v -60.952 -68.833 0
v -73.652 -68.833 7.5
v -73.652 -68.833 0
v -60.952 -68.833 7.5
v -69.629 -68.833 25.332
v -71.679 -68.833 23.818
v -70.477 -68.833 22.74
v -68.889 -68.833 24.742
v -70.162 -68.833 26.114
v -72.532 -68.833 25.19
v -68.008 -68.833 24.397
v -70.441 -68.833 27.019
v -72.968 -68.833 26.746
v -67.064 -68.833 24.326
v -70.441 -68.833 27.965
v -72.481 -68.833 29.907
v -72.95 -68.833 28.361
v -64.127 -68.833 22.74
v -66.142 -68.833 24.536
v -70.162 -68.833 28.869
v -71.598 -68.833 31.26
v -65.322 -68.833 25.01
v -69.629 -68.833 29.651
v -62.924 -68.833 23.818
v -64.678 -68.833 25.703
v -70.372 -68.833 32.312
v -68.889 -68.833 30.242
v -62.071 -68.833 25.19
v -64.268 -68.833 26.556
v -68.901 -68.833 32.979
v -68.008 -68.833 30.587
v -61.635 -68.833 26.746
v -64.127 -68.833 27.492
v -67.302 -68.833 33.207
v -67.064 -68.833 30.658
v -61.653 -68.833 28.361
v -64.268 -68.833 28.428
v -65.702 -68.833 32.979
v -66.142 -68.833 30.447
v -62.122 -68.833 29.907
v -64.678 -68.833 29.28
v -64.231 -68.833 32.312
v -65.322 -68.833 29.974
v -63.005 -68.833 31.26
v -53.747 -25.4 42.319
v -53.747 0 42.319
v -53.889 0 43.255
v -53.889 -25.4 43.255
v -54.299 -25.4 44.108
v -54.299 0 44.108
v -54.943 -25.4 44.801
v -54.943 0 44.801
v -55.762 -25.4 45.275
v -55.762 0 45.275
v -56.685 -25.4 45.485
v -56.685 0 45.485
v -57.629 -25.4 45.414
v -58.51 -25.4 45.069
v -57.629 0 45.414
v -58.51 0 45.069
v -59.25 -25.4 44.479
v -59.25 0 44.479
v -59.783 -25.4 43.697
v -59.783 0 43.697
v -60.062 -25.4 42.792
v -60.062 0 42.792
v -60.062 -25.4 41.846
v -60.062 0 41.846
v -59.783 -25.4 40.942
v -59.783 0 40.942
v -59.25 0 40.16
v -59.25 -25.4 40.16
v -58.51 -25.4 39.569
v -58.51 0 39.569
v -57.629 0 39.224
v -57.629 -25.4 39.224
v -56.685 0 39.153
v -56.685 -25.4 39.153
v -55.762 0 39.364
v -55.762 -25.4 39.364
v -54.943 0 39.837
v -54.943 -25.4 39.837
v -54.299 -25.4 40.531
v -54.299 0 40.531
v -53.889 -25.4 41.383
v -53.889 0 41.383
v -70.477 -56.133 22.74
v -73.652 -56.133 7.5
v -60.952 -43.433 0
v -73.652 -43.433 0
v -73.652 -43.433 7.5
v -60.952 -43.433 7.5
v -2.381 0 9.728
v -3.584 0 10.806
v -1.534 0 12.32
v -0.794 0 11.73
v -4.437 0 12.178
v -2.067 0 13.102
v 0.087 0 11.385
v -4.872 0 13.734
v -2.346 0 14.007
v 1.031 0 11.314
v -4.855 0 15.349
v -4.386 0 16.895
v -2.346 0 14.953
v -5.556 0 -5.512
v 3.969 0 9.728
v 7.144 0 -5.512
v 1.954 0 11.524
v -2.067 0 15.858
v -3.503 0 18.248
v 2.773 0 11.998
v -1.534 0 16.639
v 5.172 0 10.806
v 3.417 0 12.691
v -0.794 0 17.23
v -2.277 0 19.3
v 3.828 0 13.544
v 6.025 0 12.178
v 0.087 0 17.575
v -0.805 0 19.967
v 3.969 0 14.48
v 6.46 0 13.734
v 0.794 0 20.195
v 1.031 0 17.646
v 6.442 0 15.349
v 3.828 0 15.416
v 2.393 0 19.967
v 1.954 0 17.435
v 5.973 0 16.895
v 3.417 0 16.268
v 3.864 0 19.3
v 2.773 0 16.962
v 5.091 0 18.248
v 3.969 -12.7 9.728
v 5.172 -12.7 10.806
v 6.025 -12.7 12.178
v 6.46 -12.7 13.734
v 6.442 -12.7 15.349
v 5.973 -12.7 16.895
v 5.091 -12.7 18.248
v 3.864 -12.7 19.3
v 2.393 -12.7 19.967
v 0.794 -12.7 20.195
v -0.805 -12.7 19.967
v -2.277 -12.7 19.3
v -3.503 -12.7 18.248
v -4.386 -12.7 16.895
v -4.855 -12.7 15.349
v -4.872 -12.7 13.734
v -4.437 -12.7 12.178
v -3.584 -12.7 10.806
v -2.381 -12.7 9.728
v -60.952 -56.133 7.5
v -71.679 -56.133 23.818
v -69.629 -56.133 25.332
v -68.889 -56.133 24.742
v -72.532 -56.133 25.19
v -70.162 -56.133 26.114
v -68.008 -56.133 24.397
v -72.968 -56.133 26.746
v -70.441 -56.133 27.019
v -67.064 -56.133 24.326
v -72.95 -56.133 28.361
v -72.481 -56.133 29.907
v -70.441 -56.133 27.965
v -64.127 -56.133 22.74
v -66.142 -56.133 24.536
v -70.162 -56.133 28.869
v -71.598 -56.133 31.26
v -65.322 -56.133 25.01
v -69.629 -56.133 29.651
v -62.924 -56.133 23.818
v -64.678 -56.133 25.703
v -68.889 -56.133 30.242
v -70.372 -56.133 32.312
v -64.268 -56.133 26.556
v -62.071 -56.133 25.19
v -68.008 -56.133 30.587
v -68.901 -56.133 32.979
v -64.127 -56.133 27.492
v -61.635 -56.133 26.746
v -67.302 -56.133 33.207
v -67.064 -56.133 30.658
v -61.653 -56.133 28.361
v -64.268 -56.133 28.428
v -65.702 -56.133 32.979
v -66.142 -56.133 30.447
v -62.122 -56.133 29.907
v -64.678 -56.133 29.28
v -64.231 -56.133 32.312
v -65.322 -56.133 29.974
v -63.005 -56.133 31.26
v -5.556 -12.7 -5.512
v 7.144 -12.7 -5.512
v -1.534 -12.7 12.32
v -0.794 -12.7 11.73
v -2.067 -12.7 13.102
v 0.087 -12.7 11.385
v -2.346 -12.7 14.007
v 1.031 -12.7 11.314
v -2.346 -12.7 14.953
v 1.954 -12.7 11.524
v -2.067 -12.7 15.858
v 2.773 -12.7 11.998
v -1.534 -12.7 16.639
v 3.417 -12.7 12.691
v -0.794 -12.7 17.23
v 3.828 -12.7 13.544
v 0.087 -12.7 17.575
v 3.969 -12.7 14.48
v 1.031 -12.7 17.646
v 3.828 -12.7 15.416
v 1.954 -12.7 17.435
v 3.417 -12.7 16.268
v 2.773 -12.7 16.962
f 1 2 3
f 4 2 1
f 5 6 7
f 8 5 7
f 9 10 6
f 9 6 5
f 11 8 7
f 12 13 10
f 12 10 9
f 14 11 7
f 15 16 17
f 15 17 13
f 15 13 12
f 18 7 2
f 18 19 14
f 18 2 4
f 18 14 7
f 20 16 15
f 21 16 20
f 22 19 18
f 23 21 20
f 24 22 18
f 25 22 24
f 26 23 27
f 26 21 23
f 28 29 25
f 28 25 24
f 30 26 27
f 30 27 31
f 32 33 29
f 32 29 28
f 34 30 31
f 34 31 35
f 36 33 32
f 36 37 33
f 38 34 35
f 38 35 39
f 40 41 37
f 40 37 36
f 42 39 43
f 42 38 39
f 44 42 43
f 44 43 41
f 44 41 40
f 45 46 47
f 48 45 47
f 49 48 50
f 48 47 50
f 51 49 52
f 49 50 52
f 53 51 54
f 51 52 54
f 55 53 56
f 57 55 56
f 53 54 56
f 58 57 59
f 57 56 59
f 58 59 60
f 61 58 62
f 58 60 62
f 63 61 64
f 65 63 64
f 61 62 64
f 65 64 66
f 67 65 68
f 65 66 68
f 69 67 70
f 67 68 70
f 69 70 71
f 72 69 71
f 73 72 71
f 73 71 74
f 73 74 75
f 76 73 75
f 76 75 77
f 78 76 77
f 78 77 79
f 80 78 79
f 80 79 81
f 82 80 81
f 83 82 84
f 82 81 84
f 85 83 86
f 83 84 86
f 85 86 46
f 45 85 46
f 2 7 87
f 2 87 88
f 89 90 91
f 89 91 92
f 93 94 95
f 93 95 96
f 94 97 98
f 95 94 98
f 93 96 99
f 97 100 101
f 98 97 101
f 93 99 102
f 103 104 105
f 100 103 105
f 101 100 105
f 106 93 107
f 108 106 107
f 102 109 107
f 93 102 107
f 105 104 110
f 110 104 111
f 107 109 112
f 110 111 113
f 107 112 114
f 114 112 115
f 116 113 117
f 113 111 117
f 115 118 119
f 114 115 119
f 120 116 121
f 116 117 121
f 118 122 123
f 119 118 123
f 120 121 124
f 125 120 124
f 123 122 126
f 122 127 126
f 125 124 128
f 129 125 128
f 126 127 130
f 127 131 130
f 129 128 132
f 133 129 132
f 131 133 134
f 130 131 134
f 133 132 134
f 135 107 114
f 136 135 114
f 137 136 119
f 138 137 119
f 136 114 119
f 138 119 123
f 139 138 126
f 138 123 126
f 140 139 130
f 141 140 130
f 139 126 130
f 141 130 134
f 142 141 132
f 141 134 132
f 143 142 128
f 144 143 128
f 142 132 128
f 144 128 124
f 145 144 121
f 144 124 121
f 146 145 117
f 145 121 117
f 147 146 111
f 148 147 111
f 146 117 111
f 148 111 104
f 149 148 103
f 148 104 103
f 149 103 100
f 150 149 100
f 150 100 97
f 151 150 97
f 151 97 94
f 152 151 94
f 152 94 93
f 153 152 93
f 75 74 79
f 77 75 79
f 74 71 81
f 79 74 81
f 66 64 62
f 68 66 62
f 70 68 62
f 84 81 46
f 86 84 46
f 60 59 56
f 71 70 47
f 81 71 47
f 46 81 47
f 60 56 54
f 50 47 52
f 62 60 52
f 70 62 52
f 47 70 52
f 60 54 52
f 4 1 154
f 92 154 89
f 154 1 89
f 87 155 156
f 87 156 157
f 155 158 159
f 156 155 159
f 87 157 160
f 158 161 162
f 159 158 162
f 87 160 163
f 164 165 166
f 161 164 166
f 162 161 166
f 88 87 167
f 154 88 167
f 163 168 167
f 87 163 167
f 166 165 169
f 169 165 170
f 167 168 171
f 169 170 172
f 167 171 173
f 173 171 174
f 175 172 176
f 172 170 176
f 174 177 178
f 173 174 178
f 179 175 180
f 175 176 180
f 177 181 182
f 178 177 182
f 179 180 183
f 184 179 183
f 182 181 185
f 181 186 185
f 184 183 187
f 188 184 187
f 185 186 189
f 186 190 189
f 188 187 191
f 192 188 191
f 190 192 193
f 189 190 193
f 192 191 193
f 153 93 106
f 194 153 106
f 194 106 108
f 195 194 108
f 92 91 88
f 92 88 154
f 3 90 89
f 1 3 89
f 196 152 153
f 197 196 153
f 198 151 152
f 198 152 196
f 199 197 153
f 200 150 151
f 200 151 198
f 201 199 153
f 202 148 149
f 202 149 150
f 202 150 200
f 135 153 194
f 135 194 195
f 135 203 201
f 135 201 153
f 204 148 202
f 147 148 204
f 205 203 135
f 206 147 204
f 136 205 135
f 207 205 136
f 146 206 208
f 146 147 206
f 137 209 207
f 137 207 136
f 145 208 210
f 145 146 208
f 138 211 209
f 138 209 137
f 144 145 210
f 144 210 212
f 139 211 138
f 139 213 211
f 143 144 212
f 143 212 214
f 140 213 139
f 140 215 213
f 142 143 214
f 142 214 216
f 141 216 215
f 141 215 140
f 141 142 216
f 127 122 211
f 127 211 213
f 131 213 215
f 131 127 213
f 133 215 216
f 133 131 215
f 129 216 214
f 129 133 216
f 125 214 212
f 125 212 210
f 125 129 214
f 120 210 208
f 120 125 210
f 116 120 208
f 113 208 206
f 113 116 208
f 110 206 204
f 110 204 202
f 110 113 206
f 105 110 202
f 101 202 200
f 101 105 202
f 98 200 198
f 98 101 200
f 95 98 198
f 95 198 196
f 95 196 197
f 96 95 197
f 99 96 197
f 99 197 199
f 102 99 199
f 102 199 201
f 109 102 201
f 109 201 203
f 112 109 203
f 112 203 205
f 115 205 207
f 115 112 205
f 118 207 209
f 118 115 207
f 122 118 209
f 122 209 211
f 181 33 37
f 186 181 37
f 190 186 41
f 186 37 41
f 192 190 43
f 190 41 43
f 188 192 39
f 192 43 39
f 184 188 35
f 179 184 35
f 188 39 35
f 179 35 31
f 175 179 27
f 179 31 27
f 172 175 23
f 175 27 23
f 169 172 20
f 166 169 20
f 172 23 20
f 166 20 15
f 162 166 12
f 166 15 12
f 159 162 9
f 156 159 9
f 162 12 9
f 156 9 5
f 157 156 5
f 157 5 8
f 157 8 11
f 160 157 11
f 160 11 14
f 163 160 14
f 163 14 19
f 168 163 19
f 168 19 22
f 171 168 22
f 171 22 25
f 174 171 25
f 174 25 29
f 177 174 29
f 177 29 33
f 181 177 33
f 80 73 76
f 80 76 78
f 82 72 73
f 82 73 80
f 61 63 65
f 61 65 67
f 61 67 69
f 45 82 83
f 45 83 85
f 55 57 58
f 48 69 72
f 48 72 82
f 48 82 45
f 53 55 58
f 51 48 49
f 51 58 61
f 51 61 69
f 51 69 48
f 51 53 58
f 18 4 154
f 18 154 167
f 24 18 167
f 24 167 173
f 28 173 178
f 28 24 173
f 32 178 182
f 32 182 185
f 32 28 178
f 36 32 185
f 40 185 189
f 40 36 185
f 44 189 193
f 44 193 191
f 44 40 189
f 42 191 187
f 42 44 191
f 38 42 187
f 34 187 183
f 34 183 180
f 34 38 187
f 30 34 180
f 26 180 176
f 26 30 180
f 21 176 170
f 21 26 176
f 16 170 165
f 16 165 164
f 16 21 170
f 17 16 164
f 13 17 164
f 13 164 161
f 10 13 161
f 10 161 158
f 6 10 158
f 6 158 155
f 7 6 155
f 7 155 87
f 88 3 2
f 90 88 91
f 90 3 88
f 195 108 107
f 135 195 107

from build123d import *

# Parameters (mm, degrees)
F0_W     = 12.7
F0_H     = 25.4
F1_DEPTH = 7.5
F3_DEPTH = 12.7
F4_R     = 3.175
F5_DEPTH = 25.4
F6_R     = 3.175
F7_DEPTH = 12.7
F8_R     = 3.175
F9_DEPTH = 25.4


with BuildPart() as f1:
    # F0 (on Top) → F1 (new body)
    with BuildSketch(Plane.XY):
        with Locations((-67.301501, -56.133425)):
            Rectangle(F0_W, F0_H)
    extrude(amount=F1_DEPTH)

    # F2 (on face) → F3 (join)
    with BuildSketch(Plane.XZ.offset(68.833425)):
        with BuildLine():
            Line((-70.476501, 22.74), (-73.651501, 7.5))
            Line((-73.651501, 7.5), (-60.951501, 7.5))
            Line((-60.951501, 7.5), (-64.126501, 22.74))
            ThreePointArc((-64.126501, 22.74), (-67.301501, 33.206905), (-70.476501, 22.74))
        make_face()
    extrude(amount=-F3_DEPTH)

    # F4 (on face) → F5 (cut)
    with BuildSketch(Plane.XZ.offset(68.833425)):
        with Locations((-67.301501, 27.491905)):
            Circle(F4_R)
    extrude(amount=-F5_DEPTH, mode=Mode.SUBTRACT)


with BuildPart() as f7:
    # F6 (on Front) → F7 (new body)
    with BuildSketch(Plane.XZ):
        with BuildLine():
            Line((-2.38125, 9.728031), (-5.55625, -5.511969))
            Line((-5.55625, -5.511969), (7.14375, -5.511969))
            Line((7.14375, -5.511969), (3.96875, 9.728031))
            ThreePointArc((3.96875, 9.728031), (0.79375, 20.194936), (-2.38125, 9.728031))
        make_face()
        with Locations((0.79375, 14.479936)):
            Circle(F6_R, mode=Mode.SUBTRACT)
    extrude(amount=F7_DEPTH)


with BuildPart() as f9:
    # F8 (on Front) → F9 (new body)
    with BuildSketch(Plane.XZ):
        with Locations((-56.922451, 42.3191)):
            Circle(F8_R)
    extrude(amount=F9_DEPTH)


solid = Compound([f1.part, f7.part, f9.part])
